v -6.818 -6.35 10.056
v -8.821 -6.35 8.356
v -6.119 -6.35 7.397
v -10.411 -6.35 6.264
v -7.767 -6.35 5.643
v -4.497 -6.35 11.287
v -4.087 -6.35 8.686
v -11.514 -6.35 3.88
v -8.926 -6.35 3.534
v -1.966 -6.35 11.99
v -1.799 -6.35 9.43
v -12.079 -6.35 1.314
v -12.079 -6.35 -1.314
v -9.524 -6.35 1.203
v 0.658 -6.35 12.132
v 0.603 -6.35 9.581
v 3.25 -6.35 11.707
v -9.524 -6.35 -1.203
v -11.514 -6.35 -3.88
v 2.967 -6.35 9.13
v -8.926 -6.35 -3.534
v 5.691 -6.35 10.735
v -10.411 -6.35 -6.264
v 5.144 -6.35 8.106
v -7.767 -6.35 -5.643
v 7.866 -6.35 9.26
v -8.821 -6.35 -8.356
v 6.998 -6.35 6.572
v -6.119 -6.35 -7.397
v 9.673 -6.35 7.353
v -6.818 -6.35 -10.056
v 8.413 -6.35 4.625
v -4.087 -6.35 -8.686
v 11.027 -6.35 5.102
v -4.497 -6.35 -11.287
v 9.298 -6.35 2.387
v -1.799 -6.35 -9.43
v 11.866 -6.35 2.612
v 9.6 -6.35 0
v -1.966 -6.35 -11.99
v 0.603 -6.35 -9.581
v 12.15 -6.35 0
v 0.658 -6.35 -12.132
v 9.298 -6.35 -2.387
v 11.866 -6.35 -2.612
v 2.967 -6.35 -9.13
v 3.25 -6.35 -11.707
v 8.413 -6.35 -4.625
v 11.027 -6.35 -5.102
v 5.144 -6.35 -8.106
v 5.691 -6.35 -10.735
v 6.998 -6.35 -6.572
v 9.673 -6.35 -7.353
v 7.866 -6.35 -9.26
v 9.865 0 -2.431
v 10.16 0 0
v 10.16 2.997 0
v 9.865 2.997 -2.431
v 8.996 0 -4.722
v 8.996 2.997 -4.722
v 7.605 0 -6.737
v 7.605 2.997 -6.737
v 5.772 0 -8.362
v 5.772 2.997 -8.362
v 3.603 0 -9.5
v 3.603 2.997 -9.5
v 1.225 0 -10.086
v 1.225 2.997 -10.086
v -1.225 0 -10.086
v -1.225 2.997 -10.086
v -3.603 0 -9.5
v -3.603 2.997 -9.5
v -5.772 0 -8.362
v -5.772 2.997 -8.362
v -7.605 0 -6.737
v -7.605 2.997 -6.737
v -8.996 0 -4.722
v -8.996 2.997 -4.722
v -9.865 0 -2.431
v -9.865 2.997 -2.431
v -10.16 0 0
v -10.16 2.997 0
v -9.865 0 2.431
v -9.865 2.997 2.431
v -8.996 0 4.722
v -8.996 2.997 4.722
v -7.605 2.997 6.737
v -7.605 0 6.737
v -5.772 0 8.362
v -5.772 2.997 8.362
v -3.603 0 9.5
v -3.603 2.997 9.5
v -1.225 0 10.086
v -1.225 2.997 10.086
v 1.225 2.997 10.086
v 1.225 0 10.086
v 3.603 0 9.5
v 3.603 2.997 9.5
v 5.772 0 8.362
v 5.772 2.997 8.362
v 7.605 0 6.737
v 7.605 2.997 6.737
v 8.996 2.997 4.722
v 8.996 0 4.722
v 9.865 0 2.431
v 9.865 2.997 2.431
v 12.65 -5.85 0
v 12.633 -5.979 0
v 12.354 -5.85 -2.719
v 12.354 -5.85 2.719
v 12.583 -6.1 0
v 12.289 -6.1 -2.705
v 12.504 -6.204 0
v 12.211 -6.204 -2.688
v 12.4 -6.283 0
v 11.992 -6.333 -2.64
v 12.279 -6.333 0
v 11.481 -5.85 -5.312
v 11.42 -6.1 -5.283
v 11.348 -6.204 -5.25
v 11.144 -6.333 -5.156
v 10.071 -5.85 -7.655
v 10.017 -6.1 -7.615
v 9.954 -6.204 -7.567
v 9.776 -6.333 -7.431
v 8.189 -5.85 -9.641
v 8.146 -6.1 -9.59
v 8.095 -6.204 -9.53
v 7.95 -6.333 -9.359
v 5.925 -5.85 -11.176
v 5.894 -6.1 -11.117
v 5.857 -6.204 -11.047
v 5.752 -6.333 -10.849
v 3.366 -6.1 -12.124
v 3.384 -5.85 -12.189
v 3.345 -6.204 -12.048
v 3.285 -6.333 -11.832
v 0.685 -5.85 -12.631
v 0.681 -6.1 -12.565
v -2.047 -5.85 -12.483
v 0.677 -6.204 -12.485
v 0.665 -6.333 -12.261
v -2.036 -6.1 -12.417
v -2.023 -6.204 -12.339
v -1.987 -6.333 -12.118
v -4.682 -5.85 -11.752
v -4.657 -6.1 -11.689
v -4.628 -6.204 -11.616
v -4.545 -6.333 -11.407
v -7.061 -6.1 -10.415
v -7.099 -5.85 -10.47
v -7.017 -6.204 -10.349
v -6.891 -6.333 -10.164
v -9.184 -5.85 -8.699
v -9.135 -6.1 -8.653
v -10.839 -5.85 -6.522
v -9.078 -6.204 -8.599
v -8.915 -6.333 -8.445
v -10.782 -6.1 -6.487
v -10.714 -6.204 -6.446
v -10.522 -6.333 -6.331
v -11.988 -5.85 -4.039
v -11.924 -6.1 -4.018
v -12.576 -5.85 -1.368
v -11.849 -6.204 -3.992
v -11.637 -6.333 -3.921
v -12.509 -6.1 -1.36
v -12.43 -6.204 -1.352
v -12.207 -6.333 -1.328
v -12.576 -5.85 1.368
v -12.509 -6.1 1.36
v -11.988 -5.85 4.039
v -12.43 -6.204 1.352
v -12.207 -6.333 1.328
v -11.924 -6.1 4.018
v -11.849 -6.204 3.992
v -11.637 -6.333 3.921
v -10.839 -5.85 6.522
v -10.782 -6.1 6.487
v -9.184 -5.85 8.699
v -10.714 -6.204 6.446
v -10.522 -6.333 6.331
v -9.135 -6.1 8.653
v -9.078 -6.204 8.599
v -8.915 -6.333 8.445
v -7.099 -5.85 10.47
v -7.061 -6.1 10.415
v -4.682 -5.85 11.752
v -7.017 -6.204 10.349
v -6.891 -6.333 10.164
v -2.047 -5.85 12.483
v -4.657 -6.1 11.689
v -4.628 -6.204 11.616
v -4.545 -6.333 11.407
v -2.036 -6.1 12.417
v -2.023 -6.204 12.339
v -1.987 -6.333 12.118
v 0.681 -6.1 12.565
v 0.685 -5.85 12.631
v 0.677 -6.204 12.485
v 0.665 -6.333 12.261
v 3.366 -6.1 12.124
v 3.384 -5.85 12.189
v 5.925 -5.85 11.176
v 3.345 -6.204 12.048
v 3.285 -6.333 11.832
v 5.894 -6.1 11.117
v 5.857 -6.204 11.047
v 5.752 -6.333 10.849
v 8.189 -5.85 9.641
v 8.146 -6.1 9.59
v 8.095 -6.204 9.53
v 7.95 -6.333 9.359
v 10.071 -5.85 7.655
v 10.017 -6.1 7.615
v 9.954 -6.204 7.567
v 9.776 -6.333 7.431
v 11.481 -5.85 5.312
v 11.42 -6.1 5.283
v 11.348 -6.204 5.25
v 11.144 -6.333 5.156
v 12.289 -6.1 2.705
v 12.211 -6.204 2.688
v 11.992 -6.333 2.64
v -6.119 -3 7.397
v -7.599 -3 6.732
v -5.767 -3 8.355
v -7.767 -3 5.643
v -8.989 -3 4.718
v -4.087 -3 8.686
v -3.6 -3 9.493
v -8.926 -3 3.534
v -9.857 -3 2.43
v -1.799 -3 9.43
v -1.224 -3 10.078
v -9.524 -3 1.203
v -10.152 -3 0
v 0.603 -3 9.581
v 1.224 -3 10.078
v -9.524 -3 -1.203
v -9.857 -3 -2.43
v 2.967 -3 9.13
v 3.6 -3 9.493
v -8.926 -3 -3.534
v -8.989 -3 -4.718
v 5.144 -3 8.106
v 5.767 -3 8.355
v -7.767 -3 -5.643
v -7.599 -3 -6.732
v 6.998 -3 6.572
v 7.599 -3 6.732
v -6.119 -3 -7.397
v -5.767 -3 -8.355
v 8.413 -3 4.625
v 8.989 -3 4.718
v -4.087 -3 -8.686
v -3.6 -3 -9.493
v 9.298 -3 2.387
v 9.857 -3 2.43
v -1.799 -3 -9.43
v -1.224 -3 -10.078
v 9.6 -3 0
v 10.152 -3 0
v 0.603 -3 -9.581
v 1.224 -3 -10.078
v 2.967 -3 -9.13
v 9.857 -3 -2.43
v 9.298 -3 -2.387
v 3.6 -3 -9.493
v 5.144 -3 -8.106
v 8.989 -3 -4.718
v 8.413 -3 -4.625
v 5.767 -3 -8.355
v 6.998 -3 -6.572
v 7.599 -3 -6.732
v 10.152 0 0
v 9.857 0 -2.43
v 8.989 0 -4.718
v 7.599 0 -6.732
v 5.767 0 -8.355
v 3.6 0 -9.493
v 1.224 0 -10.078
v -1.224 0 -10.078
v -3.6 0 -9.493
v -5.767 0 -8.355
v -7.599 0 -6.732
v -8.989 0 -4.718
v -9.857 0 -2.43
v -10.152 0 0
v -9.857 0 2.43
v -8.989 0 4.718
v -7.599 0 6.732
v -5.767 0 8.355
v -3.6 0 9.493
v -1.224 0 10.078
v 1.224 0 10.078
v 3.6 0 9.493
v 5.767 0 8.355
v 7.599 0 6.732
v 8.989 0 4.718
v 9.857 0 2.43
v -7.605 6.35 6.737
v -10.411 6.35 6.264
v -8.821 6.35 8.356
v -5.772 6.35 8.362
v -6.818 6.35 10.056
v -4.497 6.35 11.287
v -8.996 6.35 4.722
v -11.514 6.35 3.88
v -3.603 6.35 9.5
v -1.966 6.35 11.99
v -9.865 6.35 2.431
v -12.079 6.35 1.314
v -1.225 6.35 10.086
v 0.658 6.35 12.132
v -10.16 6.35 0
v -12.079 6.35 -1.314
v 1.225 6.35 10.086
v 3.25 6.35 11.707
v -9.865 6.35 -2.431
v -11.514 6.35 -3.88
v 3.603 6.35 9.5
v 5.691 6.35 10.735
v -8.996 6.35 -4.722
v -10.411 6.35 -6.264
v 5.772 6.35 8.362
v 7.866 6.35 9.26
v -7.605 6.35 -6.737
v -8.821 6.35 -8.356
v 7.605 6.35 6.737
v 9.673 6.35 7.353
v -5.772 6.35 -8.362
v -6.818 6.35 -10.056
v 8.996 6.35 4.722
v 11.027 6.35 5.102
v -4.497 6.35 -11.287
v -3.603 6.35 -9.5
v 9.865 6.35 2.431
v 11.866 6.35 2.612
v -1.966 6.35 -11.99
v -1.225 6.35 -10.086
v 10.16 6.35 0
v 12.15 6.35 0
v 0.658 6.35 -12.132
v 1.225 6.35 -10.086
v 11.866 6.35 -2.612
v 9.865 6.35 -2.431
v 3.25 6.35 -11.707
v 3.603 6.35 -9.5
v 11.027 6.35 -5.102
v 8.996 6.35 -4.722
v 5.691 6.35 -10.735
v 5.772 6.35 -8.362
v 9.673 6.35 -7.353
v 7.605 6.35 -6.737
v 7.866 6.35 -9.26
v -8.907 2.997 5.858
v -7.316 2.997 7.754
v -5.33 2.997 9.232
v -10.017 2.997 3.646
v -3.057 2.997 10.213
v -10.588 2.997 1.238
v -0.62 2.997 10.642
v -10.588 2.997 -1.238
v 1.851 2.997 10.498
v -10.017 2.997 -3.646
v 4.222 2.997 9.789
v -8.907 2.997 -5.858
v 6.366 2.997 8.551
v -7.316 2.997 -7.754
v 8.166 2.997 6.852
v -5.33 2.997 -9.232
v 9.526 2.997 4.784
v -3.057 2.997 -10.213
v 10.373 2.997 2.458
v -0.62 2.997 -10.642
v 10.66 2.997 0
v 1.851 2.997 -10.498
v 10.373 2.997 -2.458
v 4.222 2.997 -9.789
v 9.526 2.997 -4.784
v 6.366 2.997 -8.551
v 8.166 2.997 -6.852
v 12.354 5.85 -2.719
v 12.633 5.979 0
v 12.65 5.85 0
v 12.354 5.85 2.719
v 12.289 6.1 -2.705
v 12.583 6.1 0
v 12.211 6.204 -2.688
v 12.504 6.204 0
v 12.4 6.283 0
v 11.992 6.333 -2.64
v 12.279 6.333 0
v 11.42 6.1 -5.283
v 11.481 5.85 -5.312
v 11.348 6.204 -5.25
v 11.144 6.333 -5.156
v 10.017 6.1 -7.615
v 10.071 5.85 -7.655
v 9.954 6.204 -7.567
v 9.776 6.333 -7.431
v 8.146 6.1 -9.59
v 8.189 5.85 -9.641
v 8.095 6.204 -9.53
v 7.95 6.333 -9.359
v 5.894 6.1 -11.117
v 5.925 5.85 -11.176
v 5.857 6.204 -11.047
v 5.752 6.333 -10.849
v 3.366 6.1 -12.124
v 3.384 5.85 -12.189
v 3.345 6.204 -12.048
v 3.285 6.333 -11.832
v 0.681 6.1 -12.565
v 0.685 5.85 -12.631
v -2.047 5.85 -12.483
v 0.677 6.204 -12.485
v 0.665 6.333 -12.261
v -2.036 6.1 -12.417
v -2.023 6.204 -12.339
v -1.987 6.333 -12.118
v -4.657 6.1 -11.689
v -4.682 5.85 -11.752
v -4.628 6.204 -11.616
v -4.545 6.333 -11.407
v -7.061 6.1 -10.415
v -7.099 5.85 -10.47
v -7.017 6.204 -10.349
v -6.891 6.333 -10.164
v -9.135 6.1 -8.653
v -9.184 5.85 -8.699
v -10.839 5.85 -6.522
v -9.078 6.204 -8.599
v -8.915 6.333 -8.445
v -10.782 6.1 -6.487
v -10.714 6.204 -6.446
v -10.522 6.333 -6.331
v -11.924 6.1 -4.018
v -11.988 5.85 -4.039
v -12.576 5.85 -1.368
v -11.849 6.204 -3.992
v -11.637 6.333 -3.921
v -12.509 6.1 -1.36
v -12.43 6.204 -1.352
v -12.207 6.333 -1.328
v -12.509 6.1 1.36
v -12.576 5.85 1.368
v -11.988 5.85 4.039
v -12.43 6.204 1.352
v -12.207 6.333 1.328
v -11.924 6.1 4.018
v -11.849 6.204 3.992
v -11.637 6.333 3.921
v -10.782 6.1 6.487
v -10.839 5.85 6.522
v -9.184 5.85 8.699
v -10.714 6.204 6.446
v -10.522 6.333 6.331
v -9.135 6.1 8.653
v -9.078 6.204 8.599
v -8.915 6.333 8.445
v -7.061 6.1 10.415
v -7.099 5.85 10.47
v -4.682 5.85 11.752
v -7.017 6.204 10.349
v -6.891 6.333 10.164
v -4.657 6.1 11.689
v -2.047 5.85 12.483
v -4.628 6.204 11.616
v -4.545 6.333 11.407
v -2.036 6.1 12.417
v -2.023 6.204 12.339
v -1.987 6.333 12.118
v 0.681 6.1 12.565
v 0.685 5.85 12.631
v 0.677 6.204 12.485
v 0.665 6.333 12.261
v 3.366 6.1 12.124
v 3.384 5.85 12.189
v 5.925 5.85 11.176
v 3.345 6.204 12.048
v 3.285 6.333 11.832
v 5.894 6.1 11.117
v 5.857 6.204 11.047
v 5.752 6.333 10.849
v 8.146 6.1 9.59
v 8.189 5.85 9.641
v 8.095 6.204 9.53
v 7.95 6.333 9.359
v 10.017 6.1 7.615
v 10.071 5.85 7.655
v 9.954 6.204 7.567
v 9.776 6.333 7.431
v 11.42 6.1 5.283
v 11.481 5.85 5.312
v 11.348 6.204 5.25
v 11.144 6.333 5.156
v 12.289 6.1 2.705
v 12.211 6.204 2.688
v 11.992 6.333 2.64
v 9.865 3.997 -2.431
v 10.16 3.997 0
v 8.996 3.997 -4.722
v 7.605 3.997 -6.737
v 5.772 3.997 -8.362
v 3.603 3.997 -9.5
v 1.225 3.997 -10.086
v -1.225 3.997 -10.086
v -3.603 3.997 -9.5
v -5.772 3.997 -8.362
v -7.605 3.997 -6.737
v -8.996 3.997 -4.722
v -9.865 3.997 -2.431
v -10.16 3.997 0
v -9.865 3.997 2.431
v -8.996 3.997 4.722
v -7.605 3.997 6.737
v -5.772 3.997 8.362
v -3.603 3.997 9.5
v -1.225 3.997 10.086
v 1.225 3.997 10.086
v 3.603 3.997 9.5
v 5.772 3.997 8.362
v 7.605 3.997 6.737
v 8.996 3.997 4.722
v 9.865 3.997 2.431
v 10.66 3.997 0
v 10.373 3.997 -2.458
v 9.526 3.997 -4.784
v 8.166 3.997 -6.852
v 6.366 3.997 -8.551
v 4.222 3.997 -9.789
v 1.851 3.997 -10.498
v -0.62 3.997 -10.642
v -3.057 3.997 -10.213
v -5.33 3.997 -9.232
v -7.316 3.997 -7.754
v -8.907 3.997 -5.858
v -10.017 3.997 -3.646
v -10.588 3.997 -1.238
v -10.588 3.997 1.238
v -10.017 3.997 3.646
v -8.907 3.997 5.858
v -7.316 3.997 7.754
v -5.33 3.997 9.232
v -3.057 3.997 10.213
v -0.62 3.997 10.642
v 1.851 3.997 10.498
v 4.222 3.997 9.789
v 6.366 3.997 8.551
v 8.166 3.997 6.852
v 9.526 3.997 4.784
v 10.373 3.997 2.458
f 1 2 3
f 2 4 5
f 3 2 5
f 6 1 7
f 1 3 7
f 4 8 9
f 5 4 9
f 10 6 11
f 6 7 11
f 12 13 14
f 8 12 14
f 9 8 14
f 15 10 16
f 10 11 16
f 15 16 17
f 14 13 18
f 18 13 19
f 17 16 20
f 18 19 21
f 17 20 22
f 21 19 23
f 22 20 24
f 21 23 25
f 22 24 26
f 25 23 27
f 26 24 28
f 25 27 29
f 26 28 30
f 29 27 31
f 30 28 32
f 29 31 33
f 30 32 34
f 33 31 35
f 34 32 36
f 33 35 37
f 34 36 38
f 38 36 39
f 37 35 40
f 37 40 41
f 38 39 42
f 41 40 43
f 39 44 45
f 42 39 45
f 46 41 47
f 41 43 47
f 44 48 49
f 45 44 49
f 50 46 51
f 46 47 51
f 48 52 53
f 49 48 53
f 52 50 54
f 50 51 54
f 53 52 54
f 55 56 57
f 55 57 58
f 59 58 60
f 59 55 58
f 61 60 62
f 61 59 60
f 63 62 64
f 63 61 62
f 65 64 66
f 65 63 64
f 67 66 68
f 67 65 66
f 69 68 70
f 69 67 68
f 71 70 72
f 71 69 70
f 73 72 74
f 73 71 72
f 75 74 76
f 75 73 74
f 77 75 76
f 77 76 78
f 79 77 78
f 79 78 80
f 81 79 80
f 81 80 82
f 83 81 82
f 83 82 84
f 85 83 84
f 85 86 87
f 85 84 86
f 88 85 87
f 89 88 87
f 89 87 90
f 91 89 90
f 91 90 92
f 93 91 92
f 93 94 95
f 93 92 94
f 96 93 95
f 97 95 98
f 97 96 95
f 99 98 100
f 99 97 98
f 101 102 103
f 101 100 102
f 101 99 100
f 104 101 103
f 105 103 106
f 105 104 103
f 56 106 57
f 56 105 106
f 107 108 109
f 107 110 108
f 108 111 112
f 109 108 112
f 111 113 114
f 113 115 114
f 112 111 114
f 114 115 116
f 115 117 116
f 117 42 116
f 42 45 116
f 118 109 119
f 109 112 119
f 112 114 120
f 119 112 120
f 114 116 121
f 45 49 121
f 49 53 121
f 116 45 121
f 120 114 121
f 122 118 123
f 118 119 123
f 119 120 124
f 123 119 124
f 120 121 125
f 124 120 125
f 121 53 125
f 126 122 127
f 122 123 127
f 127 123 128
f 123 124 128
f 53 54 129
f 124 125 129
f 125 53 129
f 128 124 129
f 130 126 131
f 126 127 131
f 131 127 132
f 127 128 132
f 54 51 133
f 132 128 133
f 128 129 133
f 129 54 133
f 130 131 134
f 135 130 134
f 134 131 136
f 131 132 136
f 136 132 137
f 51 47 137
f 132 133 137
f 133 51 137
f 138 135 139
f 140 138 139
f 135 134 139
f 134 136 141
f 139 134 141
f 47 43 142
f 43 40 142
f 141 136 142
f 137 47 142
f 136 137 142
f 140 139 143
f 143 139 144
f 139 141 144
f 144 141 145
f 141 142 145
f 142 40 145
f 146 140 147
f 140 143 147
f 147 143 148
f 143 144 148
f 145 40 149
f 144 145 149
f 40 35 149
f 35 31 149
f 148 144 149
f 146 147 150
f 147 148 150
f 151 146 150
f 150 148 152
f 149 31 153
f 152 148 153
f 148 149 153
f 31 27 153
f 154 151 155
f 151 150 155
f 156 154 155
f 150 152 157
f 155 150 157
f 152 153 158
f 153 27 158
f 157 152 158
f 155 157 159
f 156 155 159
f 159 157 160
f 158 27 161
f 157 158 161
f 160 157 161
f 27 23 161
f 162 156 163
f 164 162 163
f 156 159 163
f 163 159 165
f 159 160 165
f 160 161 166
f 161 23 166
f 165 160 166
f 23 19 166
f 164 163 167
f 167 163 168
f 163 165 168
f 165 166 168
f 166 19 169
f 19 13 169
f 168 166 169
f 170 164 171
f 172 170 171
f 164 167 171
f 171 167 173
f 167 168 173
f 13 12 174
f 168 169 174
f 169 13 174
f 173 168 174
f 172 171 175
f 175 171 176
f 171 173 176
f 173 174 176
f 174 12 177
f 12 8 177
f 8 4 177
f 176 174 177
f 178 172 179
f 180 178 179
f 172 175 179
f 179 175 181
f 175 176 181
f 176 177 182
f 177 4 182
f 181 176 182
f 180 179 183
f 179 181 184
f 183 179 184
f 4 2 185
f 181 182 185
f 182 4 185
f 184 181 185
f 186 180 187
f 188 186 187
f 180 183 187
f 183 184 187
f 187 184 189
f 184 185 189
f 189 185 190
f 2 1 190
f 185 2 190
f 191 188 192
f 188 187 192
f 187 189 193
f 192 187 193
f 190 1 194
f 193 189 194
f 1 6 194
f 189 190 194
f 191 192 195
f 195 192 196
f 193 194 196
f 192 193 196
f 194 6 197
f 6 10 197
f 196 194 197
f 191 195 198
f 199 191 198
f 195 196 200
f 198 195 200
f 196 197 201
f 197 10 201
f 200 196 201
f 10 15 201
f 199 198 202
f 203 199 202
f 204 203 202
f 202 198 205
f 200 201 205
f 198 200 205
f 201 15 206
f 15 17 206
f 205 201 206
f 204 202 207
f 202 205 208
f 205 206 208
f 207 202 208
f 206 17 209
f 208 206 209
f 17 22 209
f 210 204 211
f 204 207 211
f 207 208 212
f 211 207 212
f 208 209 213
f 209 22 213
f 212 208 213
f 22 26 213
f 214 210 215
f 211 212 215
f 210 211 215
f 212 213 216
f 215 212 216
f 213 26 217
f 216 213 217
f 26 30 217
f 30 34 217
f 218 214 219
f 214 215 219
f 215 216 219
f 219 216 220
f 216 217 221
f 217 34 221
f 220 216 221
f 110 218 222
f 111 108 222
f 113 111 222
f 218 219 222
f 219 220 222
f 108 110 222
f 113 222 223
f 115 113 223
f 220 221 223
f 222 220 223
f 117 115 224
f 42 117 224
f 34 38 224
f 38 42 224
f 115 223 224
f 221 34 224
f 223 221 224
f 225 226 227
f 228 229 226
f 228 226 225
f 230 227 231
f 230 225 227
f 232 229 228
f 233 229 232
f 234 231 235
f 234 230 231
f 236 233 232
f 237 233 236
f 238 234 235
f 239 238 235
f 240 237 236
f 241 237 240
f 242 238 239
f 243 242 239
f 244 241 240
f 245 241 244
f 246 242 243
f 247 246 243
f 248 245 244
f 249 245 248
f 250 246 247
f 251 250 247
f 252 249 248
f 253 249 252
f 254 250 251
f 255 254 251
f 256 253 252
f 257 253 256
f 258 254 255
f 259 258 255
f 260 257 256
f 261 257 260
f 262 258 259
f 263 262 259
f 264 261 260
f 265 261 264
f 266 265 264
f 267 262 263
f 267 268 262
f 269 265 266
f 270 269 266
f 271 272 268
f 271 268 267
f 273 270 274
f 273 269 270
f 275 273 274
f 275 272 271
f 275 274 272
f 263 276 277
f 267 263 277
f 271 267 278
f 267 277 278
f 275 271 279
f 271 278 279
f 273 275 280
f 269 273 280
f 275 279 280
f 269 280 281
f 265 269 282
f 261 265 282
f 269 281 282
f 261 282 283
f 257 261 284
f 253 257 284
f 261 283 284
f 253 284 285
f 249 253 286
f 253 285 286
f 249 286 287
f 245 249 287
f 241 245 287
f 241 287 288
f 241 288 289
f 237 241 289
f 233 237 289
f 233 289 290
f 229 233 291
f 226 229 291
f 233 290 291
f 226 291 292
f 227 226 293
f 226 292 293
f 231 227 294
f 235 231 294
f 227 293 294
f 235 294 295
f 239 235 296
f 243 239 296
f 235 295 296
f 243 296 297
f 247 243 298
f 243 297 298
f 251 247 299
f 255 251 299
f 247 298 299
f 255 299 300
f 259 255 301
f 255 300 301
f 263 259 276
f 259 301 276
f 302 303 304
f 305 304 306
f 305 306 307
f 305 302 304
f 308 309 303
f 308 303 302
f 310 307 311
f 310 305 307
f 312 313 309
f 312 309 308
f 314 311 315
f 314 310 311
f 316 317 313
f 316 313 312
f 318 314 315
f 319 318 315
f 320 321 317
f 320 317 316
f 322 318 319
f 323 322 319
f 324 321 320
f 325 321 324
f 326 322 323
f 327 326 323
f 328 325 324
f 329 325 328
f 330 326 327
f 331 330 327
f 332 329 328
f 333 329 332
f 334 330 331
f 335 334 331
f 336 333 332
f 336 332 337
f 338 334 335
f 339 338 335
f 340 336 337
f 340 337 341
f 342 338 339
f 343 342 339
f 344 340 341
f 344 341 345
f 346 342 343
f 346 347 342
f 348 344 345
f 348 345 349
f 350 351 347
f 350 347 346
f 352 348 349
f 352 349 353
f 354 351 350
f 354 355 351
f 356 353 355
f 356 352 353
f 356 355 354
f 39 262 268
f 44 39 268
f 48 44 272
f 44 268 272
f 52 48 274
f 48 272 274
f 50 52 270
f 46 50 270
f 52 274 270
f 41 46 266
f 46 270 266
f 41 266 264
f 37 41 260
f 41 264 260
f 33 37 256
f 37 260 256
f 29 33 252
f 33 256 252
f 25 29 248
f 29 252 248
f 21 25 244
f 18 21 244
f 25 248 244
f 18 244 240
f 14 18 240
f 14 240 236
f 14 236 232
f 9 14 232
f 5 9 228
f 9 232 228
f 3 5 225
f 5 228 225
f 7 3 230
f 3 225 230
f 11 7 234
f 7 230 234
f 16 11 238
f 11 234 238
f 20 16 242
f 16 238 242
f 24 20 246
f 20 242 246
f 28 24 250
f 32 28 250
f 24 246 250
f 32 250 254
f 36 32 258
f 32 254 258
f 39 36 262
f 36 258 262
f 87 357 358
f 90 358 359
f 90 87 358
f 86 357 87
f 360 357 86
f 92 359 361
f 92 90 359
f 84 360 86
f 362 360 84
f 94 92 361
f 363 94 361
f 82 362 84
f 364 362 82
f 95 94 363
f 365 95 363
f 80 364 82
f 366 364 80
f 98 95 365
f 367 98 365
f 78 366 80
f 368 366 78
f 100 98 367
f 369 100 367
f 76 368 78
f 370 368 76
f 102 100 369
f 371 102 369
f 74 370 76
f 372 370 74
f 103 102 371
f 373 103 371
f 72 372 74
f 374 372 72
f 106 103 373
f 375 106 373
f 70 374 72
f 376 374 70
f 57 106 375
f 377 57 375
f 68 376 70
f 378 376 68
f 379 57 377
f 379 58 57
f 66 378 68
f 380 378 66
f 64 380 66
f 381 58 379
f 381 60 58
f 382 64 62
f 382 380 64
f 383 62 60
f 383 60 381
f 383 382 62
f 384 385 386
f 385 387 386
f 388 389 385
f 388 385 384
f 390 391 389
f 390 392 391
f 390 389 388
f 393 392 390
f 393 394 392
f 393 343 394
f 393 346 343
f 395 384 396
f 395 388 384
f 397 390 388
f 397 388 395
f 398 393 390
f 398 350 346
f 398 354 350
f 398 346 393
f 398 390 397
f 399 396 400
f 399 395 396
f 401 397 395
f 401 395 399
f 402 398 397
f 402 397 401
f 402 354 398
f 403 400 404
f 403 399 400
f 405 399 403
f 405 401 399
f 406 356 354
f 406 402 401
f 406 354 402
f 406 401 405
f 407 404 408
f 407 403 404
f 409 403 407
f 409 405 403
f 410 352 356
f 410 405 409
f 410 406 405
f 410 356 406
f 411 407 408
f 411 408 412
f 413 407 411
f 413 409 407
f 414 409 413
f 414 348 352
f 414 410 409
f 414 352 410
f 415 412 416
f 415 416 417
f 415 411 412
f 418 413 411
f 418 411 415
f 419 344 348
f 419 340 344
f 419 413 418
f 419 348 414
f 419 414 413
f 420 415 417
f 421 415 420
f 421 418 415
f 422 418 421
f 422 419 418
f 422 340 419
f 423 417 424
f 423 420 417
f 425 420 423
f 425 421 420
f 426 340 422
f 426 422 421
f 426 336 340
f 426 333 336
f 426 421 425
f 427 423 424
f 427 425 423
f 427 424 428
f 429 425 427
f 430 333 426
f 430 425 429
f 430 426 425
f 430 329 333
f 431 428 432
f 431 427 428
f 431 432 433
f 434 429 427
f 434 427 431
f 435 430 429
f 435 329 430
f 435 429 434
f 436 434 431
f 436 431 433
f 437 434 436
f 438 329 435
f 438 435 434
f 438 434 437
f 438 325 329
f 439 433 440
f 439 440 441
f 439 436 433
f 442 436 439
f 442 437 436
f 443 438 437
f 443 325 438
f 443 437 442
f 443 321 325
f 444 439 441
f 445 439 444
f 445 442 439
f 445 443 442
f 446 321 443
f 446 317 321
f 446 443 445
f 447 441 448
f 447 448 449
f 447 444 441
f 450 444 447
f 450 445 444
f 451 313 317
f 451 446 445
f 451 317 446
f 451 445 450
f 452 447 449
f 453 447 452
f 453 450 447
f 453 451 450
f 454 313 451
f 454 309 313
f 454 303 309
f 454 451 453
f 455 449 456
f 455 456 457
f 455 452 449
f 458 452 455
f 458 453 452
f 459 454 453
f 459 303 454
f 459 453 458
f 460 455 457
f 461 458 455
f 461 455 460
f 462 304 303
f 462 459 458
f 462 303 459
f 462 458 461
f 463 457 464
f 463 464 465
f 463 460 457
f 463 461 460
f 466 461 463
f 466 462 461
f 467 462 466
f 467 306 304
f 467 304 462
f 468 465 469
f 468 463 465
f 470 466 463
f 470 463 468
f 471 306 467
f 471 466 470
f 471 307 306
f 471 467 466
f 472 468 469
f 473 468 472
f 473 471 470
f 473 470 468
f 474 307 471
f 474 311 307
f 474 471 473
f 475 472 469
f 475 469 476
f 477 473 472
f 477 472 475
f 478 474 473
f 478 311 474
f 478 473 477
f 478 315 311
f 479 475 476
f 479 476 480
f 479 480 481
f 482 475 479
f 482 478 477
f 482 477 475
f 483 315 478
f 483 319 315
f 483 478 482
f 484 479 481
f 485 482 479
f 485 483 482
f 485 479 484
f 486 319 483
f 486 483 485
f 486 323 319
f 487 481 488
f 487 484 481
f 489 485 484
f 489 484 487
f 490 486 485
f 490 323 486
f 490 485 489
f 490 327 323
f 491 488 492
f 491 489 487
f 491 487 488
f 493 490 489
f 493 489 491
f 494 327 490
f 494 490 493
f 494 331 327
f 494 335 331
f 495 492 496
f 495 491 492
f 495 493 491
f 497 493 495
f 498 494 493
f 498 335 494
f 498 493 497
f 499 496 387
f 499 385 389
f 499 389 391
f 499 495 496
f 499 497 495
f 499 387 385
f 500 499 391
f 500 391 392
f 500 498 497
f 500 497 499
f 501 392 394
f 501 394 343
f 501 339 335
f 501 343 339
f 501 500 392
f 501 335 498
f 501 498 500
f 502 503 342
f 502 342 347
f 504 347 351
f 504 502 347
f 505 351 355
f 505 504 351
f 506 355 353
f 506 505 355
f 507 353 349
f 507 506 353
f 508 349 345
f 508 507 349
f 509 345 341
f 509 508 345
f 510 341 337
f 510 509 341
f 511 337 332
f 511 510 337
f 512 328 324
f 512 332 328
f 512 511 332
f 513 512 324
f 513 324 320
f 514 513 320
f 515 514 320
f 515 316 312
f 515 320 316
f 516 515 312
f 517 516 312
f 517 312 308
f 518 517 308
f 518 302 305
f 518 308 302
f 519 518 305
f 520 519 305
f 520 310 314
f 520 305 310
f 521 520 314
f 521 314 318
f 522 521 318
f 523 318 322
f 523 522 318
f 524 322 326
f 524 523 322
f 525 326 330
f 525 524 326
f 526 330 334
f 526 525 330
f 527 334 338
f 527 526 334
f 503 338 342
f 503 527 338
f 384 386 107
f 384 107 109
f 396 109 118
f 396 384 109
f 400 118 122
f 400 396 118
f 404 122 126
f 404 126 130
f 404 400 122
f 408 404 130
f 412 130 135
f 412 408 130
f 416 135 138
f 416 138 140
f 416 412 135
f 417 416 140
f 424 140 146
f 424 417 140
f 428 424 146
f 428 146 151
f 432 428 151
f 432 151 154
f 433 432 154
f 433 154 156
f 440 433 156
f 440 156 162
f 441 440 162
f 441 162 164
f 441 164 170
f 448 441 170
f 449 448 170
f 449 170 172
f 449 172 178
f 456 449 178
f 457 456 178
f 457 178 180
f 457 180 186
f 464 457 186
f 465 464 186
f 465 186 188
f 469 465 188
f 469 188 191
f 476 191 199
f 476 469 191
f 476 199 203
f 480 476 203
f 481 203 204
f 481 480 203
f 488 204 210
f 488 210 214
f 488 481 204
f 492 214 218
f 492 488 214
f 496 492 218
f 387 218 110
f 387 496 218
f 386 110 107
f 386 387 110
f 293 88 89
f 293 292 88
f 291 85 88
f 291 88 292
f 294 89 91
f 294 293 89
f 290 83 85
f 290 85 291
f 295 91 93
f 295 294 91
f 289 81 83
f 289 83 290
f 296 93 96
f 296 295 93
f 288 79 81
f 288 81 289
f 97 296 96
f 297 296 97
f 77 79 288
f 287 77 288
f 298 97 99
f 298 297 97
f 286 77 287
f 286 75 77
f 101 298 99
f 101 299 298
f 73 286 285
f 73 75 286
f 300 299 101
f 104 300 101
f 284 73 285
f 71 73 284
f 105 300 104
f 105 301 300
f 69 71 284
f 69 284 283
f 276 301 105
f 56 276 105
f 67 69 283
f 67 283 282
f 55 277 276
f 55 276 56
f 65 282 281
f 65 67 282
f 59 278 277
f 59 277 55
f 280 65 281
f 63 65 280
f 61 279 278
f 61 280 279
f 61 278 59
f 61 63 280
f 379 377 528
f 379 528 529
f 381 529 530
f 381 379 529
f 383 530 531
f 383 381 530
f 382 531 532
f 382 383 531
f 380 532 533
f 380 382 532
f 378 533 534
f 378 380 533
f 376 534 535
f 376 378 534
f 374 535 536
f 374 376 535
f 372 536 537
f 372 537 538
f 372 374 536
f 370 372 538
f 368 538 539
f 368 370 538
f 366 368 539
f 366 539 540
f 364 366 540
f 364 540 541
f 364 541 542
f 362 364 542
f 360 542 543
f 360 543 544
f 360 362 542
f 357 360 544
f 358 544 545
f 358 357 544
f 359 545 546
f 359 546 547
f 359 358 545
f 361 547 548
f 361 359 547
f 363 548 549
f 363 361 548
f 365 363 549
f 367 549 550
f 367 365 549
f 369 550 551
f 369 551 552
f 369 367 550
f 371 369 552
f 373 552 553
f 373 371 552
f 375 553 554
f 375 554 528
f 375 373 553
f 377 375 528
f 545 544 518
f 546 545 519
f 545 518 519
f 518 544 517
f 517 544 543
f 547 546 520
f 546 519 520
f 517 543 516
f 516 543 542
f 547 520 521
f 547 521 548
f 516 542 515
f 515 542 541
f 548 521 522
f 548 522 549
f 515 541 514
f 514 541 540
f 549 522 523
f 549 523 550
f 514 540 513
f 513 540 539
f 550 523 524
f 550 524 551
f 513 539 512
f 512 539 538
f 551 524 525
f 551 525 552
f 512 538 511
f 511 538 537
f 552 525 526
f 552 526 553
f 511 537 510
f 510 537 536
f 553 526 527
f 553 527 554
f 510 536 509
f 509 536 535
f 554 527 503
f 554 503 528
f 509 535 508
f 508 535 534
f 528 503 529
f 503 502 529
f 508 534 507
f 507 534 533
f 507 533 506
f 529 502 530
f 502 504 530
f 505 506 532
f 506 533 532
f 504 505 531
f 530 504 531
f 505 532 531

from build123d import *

# Parameters (mm, degrees)
SKETCH1_R               = 12.65
BOSS_EXTRUDE1_DEPTH     = 6.35
SKETCH2_R               = 9.6
CUT_EXTRUDE1_DEPTH      = 7.35
CUT_EXTRUDE1_DEPTH_BACK = 7.35
SKETCH3_R               = 10.15238
CUT_EXTRUDE2_DEPTH      = 3
SKETCH4_R               = 10.16
CUT_EXTRUDE3_DEPTH      = 10.826
SKETCH6_R               = 10.66038
CUT_EXTRUDE4_DEPTH      = 1
FILLET1_R               = 0.5


with BuildPart() as part:
    # Sketch1 → Boss-Extrude1 (new body, symmetric)
    with BuildSketch(Plane(origin=(0, 0, 0), x_dir=(1, 0, 0), z_dir=(0, 1, 0))):
        Circle(SKETCH1_R)
    extrude(amount=BOSS_EXTRUDE1_DEPTH, both=True)

    # Sketch2 → Cut-Extrude1 (cut, two sides)
    with BuildSketch(Plane(origin=(0, 0, 0), x_dir=(1, 0, 0), z_dir=(0, 1, 0))) as cut_extrude1_sk:
        Circle(SKETCH2_R)
    extrude(amount=CUT_EXTRUDE1_DEPTH, mode=Mode.SUBTRACT)
    extrude(cut_extrude1_sk.sketch, amount=-CUT_EXTRUDE1_DEPTH_BACK, mode=Mode.SUBTRACT)

    # Sketch3 → Cut-Extrude2 (cut, symmetric)
    with BuildSketch(Plane(origin=(0, 0, 0), x_dir=(1, 0, 0), z_dir=(0, 1, 0))):
        Circle(SKETCH3_R)
    extrude(amount=CUT_EXTRUDE2_DEPTH, both=True, mode=Mode.SUBTRACT)

    # Sketch4 → Cut-Extrude3 (cut)
    with BuildSketch(Plane(origin=(0, 0, 0), x_dir=(1, 0, 0), z_dir=(0, 1, 0))):
        Circle(SKETCH4_R)
    extrude(amount=CUT_EXTRUDE3_DEPTH, mode=Mode.SUBTRACT)

    # Sketch6 → Cut-Extrude4 (cut)
    with BuildSketch(Plane(origin=(0, 2.9972, 0), x_dir=(1, 0, 0), z_dir=(0, 1, 0))):
        Circle(SKETCH6_R)
    extrude(amount=CUT_EXTRUDE4_DEPTH, mode=Mode.SUBTRACT)

    # Fillet1
    fillet1_edges = [part.edges().sort_by_distance(p)[0] for p in [
        (-12.65, -6.35, 0),
        (-12.65, 6.35, 0),
    ]]
    fillet(fillet1_edges, radius=FILLET1_R)


solid = part.part
